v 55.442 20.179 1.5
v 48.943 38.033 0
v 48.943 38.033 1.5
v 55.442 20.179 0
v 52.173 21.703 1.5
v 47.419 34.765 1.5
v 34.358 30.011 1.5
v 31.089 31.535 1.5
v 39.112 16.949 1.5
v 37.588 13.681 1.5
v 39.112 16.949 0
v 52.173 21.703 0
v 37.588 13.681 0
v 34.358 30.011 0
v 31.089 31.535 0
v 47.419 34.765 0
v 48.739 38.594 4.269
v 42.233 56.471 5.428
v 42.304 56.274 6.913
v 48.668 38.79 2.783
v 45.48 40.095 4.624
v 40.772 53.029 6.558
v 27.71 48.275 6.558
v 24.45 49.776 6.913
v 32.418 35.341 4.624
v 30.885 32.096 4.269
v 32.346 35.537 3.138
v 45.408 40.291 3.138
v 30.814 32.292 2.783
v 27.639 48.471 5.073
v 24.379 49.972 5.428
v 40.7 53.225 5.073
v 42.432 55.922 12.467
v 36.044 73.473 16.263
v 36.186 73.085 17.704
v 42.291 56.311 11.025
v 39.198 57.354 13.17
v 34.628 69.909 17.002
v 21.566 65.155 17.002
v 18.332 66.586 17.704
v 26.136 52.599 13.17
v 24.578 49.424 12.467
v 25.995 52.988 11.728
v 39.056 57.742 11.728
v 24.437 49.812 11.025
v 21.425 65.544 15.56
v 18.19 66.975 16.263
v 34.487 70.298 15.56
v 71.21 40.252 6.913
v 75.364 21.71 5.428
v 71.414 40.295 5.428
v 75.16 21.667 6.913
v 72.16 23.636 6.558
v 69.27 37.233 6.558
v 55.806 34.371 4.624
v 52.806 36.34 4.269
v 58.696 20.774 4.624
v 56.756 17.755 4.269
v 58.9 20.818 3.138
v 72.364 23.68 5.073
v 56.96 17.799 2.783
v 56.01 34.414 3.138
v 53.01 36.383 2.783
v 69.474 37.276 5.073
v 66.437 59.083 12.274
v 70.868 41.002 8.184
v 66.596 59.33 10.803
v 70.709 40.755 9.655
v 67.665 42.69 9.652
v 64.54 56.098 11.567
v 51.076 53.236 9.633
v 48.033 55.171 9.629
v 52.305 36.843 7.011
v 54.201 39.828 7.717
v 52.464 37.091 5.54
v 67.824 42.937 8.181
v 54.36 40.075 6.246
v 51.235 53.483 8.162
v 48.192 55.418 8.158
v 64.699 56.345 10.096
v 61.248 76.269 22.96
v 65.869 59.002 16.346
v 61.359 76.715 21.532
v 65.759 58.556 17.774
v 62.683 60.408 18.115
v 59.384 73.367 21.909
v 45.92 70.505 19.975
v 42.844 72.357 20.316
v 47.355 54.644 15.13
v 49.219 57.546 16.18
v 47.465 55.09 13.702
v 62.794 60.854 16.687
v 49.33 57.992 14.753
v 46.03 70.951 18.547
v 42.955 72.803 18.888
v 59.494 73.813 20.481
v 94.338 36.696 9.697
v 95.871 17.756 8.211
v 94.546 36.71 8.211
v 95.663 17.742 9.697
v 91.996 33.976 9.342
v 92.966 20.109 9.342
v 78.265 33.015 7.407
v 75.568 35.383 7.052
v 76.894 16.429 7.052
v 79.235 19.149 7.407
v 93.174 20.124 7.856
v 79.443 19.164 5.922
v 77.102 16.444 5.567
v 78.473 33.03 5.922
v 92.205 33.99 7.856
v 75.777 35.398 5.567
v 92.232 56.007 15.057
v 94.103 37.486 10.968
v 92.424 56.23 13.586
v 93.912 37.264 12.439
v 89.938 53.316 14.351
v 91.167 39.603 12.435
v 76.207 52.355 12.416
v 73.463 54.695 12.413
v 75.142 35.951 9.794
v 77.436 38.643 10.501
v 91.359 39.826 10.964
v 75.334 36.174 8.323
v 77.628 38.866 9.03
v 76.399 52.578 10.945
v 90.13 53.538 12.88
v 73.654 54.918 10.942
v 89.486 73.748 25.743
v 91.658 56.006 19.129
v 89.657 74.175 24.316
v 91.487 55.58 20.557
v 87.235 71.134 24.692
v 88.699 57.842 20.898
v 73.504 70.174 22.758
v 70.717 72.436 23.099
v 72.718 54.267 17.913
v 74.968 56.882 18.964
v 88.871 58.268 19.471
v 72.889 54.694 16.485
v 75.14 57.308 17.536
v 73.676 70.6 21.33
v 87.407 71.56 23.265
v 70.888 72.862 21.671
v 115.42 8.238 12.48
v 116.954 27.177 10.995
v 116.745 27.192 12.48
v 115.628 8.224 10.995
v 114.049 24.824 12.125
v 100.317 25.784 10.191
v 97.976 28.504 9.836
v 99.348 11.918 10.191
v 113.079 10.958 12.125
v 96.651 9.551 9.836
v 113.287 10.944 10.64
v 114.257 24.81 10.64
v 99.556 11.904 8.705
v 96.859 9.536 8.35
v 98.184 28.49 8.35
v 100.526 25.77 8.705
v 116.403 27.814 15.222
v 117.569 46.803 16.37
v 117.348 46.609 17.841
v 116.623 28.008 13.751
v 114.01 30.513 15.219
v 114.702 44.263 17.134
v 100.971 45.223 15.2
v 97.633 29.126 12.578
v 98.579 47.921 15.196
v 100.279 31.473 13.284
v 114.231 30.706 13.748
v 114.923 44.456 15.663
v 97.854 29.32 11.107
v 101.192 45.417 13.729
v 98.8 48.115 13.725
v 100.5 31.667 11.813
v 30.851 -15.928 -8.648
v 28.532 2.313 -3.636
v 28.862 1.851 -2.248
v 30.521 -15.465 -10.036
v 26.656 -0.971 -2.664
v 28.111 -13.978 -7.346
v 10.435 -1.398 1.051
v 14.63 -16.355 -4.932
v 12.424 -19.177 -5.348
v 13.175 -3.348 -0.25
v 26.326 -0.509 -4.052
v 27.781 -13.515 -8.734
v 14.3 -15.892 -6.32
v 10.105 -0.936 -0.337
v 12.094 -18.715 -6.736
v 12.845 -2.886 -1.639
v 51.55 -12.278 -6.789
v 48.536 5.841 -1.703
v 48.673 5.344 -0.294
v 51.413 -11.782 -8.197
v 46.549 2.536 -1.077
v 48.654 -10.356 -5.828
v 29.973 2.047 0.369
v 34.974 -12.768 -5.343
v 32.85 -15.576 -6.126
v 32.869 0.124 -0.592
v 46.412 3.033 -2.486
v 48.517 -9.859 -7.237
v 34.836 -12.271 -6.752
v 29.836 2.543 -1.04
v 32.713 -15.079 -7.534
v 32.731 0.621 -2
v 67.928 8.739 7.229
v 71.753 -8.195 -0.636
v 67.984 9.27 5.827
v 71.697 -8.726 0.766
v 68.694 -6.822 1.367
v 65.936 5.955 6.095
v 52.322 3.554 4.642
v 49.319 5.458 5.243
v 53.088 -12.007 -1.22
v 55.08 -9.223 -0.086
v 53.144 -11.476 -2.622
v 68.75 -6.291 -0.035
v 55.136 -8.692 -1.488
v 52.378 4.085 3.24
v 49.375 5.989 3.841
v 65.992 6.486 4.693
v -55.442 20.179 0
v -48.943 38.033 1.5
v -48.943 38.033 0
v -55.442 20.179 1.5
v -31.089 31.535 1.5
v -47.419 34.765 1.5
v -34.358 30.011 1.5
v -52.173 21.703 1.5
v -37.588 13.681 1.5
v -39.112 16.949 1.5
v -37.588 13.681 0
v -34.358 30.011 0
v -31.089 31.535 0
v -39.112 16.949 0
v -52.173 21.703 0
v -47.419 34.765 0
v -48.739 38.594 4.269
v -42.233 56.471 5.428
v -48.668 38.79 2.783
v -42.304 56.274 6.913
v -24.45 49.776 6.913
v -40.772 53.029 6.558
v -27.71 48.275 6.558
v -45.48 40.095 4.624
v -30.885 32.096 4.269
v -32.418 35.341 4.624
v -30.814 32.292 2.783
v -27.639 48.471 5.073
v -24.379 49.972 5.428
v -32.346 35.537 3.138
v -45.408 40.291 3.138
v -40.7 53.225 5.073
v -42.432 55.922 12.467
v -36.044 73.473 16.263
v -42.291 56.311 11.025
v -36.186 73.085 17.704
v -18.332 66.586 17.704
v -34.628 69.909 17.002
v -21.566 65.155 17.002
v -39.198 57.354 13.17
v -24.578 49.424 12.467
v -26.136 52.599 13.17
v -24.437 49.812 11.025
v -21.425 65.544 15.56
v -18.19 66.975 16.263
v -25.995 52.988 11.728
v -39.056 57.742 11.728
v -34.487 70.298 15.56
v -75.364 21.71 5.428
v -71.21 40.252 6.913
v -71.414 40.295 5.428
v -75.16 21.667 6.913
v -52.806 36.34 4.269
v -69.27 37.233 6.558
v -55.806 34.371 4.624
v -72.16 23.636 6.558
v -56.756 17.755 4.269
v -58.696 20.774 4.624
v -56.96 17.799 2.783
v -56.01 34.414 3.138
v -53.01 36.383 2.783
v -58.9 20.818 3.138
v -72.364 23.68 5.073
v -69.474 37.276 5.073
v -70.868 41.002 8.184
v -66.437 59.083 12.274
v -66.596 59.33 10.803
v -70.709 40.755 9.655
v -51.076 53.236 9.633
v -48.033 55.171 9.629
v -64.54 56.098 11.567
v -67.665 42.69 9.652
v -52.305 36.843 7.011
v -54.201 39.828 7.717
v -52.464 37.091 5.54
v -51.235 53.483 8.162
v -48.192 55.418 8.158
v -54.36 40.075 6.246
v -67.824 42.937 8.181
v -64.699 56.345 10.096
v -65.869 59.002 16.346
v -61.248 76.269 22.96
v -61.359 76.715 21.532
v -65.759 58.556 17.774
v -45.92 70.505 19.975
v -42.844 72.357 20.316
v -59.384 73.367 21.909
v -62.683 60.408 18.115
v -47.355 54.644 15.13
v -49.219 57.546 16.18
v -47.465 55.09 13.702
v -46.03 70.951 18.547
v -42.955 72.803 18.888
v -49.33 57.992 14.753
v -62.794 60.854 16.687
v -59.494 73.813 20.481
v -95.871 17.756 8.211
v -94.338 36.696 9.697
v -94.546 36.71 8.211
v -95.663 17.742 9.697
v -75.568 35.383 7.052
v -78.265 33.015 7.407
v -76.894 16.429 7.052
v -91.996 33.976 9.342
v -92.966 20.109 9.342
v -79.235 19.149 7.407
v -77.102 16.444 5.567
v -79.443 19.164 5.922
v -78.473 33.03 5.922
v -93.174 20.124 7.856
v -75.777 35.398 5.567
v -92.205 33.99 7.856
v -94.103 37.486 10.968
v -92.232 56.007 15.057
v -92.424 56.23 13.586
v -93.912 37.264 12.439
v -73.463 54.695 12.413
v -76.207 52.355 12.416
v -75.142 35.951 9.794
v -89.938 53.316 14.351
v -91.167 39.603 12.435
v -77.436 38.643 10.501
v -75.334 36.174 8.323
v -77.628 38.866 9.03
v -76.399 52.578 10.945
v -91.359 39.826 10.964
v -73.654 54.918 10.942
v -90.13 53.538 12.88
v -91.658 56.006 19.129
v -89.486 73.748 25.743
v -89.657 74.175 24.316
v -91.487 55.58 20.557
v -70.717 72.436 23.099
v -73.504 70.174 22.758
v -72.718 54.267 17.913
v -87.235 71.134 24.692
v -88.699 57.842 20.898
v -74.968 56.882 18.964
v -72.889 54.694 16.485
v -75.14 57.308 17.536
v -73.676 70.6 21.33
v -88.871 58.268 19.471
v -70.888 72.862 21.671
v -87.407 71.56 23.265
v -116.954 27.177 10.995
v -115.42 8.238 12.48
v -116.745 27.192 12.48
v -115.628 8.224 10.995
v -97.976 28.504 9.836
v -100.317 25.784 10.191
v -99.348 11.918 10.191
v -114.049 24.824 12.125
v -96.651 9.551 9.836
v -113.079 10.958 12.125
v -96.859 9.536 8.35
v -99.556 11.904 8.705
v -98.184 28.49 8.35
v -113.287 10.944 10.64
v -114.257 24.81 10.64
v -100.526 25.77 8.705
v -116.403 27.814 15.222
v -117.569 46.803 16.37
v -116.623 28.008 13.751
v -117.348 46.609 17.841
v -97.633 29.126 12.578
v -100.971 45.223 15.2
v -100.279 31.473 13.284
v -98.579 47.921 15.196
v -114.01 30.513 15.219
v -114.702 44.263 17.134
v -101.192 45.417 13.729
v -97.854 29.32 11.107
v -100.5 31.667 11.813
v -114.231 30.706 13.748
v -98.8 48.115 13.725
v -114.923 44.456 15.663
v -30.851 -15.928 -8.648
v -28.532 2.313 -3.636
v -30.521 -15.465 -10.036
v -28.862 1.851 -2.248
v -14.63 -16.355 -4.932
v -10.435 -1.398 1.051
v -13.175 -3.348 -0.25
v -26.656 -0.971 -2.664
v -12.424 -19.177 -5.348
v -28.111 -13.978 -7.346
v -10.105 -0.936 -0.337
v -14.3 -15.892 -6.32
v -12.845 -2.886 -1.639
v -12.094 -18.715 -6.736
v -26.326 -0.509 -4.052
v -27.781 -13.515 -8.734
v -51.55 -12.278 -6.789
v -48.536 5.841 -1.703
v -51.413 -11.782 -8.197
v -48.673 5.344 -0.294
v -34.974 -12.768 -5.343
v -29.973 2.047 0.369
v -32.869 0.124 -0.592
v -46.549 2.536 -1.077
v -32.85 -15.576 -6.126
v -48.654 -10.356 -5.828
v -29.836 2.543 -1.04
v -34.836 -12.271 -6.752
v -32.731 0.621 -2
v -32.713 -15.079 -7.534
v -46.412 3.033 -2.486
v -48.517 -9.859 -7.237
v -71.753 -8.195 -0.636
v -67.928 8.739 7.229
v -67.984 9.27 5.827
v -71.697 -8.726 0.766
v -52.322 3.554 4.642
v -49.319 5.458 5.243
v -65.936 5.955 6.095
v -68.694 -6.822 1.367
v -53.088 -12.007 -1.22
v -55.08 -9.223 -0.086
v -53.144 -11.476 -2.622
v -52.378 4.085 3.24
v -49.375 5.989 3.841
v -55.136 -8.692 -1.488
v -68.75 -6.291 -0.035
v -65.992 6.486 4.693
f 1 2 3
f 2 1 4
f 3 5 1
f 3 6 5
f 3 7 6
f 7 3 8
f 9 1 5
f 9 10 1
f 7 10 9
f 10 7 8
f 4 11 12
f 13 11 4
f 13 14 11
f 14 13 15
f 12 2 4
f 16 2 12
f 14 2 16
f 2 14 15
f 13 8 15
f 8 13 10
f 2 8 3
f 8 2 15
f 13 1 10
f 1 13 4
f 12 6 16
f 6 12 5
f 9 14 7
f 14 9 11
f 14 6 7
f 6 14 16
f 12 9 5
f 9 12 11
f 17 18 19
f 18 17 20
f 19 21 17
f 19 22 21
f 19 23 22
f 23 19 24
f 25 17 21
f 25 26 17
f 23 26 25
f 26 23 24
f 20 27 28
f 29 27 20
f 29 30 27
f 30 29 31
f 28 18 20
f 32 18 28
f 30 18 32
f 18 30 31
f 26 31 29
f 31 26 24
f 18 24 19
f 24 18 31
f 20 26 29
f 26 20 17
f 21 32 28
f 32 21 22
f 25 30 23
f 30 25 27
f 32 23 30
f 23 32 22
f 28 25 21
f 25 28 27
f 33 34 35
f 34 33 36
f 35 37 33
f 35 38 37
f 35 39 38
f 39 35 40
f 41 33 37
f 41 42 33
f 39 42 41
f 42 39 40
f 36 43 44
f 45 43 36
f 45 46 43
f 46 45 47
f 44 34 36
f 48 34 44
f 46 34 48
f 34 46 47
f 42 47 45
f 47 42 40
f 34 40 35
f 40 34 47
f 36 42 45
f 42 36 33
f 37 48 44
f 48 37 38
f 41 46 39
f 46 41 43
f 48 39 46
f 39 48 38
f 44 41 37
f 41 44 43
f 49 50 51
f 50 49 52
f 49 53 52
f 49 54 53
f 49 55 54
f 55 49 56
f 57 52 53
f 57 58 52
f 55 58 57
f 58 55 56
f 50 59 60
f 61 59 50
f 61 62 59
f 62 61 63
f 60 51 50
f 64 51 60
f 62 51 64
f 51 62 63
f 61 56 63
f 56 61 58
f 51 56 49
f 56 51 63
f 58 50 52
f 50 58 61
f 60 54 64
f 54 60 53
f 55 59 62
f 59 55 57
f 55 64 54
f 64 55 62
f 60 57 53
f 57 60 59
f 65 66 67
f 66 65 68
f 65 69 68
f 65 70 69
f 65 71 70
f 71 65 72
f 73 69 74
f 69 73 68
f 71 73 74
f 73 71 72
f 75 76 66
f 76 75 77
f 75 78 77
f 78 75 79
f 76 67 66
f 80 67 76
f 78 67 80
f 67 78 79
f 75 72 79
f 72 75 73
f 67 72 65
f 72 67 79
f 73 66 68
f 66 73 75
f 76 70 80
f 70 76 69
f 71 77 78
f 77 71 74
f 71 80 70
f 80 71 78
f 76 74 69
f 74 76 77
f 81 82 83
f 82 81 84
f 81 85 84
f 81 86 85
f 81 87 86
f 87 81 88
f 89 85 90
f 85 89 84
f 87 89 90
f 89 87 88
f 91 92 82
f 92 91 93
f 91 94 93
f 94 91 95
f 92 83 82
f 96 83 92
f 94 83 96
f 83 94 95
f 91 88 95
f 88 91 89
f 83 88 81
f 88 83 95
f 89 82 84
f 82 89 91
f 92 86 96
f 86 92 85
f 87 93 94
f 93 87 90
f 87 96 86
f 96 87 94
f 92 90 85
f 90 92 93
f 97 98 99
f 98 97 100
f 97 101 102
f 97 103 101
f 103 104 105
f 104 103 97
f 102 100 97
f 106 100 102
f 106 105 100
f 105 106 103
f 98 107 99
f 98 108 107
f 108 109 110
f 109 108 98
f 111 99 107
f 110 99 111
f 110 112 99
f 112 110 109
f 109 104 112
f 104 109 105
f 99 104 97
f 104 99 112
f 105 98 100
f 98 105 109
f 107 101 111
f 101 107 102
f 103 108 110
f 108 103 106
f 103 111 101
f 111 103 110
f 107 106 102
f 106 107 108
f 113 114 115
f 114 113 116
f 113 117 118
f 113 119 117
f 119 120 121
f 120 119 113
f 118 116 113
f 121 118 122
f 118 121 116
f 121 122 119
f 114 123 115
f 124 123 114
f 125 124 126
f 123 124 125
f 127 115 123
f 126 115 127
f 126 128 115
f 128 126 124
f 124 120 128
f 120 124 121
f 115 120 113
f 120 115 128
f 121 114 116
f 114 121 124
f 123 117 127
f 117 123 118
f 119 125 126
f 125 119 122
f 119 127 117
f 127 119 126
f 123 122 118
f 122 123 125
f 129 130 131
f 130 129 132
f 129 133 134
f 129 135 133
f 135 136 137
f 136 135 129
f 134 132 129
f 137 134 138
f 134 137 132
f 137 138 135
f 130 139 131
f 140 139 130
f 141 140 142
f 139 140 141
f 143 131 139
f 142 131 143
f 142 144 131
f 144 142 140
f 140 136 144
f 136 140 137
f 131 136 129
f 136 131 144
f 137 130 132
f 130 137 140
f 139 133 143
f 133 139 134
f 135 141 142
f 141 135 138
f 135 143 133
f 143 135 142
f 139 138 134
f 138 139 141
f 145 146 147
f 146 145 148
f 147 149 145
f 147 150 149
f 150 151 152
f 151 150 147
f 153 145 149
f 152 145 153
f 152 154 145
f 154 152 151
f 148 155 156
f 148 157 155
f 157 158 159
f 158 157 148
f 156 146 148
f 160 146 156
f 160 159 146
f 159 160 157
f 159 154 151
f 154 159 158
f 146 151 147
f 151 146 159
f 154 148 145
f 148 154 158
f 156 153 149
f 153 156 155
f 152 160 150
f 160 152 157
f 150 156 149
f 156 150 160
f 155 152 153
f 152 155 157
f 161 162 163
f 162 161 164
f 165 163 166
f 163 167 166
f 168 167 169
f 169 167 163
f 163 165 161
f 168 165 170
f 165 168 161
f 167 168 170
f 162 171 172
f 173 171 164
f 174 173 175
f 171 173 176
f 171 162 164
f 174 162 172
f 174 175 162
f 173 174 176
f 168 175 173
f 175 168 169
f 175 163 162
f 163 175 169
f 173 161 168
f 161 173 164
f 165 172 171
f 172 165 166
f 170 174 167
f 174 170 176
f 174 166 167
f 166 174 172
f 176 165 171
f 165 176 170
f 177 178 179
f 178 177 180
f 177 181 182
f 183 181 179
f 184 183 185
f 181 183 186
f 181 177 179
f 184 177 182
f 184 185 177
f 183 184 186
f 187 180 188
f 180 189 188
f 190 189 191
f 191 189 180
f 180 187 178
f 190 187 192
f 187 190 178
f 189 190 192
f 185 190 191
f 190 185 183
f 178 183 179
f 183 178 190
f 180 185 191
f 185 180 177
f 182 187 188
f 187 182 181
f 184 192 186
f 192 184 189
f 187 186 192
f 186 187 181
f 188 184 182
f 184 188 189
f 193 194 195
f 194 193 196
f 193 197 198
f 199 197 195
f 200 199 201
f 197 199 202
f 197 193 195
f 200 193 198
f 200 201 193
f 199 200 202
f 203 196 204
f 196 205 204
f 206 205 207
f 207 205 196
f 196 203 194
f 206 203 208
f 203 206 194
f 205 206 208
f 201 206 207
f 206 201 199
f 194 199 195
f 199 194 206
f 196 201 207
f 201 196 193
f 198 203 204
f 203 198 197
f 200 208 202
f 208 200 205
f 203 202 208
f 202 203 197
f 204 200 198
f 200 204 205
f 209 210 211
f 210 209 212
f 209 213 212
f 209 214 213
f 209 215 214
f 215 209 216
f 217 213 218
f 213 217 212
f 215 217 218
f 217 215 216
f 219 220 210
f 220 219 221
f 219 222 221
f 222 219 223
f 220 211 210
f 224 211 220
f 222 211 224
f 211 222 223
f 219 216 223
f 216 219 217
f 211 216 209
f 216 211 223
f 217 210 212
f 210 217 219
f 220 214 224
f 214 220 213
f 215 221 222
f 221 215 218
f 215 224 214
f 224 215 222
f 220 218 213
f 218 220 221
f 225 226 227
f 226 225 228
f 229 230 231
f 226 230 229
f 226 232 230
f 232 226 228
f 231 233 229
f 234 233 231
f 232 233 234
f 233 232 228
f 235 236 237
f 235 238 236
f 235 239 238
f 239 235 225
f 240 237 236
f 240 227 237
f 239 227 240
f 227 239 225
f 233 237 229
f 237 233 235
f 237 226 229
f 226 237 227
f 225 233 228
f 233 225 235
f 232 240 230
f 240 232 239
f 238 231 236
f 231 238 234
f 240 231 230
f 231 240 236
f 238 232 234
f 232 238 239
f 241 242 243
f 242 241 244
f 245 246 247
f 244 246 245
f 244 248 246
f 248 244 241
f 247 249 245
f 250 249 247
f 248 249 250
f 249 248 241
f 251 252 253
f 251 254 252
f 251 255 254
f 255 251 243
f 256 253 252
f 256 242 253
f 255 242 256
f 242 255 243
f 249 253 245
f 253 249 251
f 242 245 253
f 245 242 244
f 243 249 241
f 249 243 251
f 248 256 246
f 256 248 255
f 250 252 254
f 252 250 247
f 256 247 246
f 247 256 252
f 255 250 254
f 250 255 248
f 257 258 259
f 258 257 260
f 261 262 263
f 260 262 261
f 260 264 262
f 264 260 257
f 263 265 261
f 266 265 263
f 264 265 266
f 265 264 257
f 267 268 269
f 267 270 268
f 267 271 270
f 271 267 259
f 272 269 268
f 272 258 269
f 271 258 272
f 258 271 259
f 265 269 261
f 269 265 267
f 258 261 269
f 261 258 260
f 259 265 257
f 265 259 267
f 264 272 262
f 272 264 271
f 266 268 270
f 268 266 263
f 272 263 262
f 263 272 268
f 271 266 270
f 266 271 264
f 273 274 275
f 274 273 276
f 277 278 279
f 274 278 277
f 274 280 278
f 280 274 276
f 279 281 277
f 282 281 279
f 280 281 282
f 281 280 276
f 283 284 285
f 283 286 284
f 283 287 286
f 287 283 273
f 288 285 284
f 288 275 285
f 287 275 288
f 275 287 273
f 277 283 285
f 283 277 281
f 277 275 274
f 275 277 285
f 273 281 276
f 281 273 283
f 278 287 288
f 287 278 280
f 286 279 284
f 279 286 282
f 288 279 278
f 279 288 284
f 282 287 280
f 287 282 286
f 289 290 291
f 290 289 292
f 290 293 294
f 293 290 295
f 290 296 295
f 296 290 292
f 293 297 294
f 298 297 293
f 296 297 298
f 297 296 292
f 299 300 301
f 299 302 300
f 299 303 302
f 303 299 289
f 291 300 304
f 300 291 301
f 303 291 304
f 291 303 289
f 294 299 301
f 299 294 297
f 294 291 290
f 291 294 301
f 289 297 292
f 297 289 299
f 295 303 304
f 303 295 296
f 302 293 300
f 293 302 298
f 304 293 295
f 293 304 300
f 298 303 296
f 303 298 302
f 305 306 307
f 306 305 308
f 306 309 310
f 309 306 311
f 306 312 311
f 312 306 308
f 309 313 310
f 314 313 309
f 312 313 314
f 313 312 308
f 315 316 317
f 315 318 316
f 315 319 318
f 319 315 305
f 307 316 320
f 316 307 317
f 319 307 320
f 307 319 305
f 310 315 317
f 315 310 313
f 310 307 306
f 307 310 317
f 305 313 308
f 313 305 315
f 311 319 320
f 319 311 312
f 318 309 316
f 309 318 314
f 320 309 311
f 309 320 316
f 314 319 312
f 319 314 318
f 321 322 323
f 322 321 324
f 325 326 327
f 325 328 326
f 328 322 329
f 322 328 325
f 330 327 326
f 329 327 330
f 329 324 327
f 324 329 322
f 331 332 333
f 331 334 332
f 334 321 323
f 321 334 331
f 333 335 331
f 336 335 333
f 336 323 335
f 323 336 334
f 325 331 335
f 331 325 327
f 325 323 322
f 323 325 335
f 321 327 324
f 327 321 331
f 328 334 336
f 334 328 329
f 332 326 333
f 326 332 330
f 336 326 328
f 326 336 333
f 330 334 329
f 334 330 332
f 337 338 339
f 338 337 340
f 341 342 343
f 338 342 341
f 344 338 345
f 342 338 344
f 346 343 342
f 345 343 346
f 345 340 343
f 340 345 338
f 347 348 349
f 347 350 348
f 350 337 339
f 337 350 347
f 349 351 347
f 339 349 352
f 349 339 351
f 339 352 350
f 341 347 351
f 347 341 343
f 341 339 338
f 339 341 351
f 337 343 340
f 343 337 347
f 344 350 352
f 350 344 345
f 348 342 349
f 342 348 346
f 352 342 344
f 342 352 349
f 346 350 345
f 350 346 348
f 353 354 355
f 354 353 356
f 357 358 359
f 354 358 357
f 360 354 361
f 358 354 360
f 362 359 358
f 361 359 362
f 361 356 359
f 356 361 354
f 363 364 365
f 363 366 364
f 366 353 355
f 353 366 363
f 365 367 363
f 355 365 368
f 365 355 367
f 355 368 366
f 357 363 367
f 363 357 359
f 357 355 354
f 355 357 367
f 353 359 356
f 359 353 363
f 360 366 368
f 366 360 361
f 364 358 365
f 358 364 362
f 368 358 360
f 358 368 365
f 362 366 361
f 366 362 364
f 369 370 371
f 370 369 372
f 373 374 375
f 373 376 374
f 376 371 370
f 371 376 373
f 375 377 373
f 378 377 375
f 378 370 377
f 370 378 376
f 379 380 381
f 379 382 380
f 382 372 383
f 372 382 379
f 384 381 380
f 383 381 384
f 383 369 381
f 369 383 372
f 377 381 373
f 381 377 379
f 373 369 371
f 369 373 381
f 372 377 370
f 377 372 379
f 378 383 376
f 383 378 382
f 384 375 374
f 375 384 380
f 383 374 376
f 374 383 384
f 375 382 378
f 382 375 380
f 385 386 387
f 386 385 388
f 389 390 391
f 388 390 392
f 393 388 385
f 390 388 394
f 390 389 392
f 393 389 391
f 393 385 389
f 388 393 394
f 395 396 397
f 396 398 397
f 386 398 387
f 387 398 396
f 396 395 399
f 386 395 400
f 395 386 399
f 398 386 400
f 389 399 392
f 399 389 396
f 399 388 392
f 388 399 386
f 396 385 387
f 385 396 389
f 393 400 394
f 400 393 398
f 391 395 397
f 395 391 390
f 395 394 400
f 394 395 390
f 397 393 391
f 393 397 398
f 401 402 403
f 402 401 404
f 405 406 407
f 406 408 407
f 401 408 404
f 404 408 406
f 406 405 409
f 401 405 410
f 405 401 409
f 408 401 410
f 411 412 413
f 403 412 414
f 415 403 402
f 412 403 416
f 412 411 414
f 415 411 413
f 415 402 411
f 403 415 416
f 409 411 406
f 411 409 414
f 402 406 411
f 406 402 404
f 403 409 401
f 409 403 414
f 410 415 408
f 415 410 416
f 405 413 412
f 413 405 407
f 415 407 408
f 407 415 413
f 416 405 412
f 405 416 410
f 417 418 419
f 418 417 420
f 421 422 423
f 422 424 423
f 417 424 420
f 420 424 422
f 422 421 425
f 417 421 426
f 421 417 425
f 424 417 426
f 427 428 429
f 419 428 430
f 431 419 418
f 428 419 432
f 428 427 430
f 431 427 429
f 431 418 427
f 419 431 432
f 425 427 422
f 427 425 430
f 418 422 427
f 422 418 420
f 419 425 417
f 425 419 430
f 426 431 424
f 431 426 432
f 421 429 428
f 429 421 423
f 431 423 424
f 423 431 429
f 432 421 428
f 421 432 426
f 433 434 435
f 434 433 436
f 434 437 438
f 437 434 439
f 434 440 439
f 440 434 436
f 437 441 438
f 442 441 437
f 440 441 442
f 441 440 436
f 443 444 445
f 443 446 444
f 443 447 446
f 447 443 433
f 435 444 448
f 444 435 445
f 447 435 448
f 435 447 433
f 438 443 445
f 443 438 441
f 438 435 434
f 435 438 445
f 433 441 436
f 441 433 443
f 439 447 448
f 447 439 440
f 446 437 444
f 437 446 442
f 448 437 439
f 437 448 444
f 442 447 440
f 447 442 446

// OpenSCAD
module key(){
    difference(){
        cube([19,19,1.5]);
        translate([2.55,2.55,0])
            cube([13.9,13.9,3]);
    };
}

angle = 8;
gap = 20;

rotate([0,0,20])
translate([40,0,0]){
    for(i=[0:2]){
        rotate([8*i,angle*0,angle*0]){
            translate([gap*0,i*gap,0]){
                key();
            }
        }
    }

    for(i=[0:2]){
        rotate([8*i,angle*-1,angle*-1]){
            translate([1*gap,i*gap,0]){
                key();
            }
        }
    }

    for(i=[0:2]){
        rotate([8*i,angle*-1,angle*-2]){
            translate([2*gap,i*gap,0]){
                key();
            }
        }
    }


    for(i=[0:1]){
        rotate([8*i,angle*-1,angle*-3]){
            translate([3*gap,i*gap,0]){
                key();
            }
        }
    }
}

translate([10,0,0])
for(i=[0:2]){
    rotate([20,-angle*i+10,10]){
        translate([gap*i,-20,0]){
            key();
        }
    }
}

rotate([0,0,-20])
translate([-40,0,0]){
    mirror([1,0,0]){
        for(i=[0:2]){
            rotate([8*i,angle*0,angle*0]){
                translate([gap*0,i*gap,0]){
                    key();
                }
            }
        }

        for(i=[0:2]){
            rotate([8*i,angle*-1,angle*-1]){
                translate([1*gap,i*gap,0]){
                    key();
                }
            }
        }

        for(i=[0:2]){
            rotate([8*i,angle*-1,angle*-2]){
                translate([2*gap,i*gap,0]){
                    key();
                }
            }
        }


        for(i=[0:1]){
            rotate([8*i,angle*-1,angle*-3]){
                translate([3*gap,i*gap,0]){
                    key();
                }
            }
        }
    }
}


translate([-10,0,0])
mirror([1,0,0]){
    for(i=[0:2]){
        rotate([20,-angle*i+10,10]){
            translate([gap*i,-20,0]){
                key();
            }
        }
    }
}
